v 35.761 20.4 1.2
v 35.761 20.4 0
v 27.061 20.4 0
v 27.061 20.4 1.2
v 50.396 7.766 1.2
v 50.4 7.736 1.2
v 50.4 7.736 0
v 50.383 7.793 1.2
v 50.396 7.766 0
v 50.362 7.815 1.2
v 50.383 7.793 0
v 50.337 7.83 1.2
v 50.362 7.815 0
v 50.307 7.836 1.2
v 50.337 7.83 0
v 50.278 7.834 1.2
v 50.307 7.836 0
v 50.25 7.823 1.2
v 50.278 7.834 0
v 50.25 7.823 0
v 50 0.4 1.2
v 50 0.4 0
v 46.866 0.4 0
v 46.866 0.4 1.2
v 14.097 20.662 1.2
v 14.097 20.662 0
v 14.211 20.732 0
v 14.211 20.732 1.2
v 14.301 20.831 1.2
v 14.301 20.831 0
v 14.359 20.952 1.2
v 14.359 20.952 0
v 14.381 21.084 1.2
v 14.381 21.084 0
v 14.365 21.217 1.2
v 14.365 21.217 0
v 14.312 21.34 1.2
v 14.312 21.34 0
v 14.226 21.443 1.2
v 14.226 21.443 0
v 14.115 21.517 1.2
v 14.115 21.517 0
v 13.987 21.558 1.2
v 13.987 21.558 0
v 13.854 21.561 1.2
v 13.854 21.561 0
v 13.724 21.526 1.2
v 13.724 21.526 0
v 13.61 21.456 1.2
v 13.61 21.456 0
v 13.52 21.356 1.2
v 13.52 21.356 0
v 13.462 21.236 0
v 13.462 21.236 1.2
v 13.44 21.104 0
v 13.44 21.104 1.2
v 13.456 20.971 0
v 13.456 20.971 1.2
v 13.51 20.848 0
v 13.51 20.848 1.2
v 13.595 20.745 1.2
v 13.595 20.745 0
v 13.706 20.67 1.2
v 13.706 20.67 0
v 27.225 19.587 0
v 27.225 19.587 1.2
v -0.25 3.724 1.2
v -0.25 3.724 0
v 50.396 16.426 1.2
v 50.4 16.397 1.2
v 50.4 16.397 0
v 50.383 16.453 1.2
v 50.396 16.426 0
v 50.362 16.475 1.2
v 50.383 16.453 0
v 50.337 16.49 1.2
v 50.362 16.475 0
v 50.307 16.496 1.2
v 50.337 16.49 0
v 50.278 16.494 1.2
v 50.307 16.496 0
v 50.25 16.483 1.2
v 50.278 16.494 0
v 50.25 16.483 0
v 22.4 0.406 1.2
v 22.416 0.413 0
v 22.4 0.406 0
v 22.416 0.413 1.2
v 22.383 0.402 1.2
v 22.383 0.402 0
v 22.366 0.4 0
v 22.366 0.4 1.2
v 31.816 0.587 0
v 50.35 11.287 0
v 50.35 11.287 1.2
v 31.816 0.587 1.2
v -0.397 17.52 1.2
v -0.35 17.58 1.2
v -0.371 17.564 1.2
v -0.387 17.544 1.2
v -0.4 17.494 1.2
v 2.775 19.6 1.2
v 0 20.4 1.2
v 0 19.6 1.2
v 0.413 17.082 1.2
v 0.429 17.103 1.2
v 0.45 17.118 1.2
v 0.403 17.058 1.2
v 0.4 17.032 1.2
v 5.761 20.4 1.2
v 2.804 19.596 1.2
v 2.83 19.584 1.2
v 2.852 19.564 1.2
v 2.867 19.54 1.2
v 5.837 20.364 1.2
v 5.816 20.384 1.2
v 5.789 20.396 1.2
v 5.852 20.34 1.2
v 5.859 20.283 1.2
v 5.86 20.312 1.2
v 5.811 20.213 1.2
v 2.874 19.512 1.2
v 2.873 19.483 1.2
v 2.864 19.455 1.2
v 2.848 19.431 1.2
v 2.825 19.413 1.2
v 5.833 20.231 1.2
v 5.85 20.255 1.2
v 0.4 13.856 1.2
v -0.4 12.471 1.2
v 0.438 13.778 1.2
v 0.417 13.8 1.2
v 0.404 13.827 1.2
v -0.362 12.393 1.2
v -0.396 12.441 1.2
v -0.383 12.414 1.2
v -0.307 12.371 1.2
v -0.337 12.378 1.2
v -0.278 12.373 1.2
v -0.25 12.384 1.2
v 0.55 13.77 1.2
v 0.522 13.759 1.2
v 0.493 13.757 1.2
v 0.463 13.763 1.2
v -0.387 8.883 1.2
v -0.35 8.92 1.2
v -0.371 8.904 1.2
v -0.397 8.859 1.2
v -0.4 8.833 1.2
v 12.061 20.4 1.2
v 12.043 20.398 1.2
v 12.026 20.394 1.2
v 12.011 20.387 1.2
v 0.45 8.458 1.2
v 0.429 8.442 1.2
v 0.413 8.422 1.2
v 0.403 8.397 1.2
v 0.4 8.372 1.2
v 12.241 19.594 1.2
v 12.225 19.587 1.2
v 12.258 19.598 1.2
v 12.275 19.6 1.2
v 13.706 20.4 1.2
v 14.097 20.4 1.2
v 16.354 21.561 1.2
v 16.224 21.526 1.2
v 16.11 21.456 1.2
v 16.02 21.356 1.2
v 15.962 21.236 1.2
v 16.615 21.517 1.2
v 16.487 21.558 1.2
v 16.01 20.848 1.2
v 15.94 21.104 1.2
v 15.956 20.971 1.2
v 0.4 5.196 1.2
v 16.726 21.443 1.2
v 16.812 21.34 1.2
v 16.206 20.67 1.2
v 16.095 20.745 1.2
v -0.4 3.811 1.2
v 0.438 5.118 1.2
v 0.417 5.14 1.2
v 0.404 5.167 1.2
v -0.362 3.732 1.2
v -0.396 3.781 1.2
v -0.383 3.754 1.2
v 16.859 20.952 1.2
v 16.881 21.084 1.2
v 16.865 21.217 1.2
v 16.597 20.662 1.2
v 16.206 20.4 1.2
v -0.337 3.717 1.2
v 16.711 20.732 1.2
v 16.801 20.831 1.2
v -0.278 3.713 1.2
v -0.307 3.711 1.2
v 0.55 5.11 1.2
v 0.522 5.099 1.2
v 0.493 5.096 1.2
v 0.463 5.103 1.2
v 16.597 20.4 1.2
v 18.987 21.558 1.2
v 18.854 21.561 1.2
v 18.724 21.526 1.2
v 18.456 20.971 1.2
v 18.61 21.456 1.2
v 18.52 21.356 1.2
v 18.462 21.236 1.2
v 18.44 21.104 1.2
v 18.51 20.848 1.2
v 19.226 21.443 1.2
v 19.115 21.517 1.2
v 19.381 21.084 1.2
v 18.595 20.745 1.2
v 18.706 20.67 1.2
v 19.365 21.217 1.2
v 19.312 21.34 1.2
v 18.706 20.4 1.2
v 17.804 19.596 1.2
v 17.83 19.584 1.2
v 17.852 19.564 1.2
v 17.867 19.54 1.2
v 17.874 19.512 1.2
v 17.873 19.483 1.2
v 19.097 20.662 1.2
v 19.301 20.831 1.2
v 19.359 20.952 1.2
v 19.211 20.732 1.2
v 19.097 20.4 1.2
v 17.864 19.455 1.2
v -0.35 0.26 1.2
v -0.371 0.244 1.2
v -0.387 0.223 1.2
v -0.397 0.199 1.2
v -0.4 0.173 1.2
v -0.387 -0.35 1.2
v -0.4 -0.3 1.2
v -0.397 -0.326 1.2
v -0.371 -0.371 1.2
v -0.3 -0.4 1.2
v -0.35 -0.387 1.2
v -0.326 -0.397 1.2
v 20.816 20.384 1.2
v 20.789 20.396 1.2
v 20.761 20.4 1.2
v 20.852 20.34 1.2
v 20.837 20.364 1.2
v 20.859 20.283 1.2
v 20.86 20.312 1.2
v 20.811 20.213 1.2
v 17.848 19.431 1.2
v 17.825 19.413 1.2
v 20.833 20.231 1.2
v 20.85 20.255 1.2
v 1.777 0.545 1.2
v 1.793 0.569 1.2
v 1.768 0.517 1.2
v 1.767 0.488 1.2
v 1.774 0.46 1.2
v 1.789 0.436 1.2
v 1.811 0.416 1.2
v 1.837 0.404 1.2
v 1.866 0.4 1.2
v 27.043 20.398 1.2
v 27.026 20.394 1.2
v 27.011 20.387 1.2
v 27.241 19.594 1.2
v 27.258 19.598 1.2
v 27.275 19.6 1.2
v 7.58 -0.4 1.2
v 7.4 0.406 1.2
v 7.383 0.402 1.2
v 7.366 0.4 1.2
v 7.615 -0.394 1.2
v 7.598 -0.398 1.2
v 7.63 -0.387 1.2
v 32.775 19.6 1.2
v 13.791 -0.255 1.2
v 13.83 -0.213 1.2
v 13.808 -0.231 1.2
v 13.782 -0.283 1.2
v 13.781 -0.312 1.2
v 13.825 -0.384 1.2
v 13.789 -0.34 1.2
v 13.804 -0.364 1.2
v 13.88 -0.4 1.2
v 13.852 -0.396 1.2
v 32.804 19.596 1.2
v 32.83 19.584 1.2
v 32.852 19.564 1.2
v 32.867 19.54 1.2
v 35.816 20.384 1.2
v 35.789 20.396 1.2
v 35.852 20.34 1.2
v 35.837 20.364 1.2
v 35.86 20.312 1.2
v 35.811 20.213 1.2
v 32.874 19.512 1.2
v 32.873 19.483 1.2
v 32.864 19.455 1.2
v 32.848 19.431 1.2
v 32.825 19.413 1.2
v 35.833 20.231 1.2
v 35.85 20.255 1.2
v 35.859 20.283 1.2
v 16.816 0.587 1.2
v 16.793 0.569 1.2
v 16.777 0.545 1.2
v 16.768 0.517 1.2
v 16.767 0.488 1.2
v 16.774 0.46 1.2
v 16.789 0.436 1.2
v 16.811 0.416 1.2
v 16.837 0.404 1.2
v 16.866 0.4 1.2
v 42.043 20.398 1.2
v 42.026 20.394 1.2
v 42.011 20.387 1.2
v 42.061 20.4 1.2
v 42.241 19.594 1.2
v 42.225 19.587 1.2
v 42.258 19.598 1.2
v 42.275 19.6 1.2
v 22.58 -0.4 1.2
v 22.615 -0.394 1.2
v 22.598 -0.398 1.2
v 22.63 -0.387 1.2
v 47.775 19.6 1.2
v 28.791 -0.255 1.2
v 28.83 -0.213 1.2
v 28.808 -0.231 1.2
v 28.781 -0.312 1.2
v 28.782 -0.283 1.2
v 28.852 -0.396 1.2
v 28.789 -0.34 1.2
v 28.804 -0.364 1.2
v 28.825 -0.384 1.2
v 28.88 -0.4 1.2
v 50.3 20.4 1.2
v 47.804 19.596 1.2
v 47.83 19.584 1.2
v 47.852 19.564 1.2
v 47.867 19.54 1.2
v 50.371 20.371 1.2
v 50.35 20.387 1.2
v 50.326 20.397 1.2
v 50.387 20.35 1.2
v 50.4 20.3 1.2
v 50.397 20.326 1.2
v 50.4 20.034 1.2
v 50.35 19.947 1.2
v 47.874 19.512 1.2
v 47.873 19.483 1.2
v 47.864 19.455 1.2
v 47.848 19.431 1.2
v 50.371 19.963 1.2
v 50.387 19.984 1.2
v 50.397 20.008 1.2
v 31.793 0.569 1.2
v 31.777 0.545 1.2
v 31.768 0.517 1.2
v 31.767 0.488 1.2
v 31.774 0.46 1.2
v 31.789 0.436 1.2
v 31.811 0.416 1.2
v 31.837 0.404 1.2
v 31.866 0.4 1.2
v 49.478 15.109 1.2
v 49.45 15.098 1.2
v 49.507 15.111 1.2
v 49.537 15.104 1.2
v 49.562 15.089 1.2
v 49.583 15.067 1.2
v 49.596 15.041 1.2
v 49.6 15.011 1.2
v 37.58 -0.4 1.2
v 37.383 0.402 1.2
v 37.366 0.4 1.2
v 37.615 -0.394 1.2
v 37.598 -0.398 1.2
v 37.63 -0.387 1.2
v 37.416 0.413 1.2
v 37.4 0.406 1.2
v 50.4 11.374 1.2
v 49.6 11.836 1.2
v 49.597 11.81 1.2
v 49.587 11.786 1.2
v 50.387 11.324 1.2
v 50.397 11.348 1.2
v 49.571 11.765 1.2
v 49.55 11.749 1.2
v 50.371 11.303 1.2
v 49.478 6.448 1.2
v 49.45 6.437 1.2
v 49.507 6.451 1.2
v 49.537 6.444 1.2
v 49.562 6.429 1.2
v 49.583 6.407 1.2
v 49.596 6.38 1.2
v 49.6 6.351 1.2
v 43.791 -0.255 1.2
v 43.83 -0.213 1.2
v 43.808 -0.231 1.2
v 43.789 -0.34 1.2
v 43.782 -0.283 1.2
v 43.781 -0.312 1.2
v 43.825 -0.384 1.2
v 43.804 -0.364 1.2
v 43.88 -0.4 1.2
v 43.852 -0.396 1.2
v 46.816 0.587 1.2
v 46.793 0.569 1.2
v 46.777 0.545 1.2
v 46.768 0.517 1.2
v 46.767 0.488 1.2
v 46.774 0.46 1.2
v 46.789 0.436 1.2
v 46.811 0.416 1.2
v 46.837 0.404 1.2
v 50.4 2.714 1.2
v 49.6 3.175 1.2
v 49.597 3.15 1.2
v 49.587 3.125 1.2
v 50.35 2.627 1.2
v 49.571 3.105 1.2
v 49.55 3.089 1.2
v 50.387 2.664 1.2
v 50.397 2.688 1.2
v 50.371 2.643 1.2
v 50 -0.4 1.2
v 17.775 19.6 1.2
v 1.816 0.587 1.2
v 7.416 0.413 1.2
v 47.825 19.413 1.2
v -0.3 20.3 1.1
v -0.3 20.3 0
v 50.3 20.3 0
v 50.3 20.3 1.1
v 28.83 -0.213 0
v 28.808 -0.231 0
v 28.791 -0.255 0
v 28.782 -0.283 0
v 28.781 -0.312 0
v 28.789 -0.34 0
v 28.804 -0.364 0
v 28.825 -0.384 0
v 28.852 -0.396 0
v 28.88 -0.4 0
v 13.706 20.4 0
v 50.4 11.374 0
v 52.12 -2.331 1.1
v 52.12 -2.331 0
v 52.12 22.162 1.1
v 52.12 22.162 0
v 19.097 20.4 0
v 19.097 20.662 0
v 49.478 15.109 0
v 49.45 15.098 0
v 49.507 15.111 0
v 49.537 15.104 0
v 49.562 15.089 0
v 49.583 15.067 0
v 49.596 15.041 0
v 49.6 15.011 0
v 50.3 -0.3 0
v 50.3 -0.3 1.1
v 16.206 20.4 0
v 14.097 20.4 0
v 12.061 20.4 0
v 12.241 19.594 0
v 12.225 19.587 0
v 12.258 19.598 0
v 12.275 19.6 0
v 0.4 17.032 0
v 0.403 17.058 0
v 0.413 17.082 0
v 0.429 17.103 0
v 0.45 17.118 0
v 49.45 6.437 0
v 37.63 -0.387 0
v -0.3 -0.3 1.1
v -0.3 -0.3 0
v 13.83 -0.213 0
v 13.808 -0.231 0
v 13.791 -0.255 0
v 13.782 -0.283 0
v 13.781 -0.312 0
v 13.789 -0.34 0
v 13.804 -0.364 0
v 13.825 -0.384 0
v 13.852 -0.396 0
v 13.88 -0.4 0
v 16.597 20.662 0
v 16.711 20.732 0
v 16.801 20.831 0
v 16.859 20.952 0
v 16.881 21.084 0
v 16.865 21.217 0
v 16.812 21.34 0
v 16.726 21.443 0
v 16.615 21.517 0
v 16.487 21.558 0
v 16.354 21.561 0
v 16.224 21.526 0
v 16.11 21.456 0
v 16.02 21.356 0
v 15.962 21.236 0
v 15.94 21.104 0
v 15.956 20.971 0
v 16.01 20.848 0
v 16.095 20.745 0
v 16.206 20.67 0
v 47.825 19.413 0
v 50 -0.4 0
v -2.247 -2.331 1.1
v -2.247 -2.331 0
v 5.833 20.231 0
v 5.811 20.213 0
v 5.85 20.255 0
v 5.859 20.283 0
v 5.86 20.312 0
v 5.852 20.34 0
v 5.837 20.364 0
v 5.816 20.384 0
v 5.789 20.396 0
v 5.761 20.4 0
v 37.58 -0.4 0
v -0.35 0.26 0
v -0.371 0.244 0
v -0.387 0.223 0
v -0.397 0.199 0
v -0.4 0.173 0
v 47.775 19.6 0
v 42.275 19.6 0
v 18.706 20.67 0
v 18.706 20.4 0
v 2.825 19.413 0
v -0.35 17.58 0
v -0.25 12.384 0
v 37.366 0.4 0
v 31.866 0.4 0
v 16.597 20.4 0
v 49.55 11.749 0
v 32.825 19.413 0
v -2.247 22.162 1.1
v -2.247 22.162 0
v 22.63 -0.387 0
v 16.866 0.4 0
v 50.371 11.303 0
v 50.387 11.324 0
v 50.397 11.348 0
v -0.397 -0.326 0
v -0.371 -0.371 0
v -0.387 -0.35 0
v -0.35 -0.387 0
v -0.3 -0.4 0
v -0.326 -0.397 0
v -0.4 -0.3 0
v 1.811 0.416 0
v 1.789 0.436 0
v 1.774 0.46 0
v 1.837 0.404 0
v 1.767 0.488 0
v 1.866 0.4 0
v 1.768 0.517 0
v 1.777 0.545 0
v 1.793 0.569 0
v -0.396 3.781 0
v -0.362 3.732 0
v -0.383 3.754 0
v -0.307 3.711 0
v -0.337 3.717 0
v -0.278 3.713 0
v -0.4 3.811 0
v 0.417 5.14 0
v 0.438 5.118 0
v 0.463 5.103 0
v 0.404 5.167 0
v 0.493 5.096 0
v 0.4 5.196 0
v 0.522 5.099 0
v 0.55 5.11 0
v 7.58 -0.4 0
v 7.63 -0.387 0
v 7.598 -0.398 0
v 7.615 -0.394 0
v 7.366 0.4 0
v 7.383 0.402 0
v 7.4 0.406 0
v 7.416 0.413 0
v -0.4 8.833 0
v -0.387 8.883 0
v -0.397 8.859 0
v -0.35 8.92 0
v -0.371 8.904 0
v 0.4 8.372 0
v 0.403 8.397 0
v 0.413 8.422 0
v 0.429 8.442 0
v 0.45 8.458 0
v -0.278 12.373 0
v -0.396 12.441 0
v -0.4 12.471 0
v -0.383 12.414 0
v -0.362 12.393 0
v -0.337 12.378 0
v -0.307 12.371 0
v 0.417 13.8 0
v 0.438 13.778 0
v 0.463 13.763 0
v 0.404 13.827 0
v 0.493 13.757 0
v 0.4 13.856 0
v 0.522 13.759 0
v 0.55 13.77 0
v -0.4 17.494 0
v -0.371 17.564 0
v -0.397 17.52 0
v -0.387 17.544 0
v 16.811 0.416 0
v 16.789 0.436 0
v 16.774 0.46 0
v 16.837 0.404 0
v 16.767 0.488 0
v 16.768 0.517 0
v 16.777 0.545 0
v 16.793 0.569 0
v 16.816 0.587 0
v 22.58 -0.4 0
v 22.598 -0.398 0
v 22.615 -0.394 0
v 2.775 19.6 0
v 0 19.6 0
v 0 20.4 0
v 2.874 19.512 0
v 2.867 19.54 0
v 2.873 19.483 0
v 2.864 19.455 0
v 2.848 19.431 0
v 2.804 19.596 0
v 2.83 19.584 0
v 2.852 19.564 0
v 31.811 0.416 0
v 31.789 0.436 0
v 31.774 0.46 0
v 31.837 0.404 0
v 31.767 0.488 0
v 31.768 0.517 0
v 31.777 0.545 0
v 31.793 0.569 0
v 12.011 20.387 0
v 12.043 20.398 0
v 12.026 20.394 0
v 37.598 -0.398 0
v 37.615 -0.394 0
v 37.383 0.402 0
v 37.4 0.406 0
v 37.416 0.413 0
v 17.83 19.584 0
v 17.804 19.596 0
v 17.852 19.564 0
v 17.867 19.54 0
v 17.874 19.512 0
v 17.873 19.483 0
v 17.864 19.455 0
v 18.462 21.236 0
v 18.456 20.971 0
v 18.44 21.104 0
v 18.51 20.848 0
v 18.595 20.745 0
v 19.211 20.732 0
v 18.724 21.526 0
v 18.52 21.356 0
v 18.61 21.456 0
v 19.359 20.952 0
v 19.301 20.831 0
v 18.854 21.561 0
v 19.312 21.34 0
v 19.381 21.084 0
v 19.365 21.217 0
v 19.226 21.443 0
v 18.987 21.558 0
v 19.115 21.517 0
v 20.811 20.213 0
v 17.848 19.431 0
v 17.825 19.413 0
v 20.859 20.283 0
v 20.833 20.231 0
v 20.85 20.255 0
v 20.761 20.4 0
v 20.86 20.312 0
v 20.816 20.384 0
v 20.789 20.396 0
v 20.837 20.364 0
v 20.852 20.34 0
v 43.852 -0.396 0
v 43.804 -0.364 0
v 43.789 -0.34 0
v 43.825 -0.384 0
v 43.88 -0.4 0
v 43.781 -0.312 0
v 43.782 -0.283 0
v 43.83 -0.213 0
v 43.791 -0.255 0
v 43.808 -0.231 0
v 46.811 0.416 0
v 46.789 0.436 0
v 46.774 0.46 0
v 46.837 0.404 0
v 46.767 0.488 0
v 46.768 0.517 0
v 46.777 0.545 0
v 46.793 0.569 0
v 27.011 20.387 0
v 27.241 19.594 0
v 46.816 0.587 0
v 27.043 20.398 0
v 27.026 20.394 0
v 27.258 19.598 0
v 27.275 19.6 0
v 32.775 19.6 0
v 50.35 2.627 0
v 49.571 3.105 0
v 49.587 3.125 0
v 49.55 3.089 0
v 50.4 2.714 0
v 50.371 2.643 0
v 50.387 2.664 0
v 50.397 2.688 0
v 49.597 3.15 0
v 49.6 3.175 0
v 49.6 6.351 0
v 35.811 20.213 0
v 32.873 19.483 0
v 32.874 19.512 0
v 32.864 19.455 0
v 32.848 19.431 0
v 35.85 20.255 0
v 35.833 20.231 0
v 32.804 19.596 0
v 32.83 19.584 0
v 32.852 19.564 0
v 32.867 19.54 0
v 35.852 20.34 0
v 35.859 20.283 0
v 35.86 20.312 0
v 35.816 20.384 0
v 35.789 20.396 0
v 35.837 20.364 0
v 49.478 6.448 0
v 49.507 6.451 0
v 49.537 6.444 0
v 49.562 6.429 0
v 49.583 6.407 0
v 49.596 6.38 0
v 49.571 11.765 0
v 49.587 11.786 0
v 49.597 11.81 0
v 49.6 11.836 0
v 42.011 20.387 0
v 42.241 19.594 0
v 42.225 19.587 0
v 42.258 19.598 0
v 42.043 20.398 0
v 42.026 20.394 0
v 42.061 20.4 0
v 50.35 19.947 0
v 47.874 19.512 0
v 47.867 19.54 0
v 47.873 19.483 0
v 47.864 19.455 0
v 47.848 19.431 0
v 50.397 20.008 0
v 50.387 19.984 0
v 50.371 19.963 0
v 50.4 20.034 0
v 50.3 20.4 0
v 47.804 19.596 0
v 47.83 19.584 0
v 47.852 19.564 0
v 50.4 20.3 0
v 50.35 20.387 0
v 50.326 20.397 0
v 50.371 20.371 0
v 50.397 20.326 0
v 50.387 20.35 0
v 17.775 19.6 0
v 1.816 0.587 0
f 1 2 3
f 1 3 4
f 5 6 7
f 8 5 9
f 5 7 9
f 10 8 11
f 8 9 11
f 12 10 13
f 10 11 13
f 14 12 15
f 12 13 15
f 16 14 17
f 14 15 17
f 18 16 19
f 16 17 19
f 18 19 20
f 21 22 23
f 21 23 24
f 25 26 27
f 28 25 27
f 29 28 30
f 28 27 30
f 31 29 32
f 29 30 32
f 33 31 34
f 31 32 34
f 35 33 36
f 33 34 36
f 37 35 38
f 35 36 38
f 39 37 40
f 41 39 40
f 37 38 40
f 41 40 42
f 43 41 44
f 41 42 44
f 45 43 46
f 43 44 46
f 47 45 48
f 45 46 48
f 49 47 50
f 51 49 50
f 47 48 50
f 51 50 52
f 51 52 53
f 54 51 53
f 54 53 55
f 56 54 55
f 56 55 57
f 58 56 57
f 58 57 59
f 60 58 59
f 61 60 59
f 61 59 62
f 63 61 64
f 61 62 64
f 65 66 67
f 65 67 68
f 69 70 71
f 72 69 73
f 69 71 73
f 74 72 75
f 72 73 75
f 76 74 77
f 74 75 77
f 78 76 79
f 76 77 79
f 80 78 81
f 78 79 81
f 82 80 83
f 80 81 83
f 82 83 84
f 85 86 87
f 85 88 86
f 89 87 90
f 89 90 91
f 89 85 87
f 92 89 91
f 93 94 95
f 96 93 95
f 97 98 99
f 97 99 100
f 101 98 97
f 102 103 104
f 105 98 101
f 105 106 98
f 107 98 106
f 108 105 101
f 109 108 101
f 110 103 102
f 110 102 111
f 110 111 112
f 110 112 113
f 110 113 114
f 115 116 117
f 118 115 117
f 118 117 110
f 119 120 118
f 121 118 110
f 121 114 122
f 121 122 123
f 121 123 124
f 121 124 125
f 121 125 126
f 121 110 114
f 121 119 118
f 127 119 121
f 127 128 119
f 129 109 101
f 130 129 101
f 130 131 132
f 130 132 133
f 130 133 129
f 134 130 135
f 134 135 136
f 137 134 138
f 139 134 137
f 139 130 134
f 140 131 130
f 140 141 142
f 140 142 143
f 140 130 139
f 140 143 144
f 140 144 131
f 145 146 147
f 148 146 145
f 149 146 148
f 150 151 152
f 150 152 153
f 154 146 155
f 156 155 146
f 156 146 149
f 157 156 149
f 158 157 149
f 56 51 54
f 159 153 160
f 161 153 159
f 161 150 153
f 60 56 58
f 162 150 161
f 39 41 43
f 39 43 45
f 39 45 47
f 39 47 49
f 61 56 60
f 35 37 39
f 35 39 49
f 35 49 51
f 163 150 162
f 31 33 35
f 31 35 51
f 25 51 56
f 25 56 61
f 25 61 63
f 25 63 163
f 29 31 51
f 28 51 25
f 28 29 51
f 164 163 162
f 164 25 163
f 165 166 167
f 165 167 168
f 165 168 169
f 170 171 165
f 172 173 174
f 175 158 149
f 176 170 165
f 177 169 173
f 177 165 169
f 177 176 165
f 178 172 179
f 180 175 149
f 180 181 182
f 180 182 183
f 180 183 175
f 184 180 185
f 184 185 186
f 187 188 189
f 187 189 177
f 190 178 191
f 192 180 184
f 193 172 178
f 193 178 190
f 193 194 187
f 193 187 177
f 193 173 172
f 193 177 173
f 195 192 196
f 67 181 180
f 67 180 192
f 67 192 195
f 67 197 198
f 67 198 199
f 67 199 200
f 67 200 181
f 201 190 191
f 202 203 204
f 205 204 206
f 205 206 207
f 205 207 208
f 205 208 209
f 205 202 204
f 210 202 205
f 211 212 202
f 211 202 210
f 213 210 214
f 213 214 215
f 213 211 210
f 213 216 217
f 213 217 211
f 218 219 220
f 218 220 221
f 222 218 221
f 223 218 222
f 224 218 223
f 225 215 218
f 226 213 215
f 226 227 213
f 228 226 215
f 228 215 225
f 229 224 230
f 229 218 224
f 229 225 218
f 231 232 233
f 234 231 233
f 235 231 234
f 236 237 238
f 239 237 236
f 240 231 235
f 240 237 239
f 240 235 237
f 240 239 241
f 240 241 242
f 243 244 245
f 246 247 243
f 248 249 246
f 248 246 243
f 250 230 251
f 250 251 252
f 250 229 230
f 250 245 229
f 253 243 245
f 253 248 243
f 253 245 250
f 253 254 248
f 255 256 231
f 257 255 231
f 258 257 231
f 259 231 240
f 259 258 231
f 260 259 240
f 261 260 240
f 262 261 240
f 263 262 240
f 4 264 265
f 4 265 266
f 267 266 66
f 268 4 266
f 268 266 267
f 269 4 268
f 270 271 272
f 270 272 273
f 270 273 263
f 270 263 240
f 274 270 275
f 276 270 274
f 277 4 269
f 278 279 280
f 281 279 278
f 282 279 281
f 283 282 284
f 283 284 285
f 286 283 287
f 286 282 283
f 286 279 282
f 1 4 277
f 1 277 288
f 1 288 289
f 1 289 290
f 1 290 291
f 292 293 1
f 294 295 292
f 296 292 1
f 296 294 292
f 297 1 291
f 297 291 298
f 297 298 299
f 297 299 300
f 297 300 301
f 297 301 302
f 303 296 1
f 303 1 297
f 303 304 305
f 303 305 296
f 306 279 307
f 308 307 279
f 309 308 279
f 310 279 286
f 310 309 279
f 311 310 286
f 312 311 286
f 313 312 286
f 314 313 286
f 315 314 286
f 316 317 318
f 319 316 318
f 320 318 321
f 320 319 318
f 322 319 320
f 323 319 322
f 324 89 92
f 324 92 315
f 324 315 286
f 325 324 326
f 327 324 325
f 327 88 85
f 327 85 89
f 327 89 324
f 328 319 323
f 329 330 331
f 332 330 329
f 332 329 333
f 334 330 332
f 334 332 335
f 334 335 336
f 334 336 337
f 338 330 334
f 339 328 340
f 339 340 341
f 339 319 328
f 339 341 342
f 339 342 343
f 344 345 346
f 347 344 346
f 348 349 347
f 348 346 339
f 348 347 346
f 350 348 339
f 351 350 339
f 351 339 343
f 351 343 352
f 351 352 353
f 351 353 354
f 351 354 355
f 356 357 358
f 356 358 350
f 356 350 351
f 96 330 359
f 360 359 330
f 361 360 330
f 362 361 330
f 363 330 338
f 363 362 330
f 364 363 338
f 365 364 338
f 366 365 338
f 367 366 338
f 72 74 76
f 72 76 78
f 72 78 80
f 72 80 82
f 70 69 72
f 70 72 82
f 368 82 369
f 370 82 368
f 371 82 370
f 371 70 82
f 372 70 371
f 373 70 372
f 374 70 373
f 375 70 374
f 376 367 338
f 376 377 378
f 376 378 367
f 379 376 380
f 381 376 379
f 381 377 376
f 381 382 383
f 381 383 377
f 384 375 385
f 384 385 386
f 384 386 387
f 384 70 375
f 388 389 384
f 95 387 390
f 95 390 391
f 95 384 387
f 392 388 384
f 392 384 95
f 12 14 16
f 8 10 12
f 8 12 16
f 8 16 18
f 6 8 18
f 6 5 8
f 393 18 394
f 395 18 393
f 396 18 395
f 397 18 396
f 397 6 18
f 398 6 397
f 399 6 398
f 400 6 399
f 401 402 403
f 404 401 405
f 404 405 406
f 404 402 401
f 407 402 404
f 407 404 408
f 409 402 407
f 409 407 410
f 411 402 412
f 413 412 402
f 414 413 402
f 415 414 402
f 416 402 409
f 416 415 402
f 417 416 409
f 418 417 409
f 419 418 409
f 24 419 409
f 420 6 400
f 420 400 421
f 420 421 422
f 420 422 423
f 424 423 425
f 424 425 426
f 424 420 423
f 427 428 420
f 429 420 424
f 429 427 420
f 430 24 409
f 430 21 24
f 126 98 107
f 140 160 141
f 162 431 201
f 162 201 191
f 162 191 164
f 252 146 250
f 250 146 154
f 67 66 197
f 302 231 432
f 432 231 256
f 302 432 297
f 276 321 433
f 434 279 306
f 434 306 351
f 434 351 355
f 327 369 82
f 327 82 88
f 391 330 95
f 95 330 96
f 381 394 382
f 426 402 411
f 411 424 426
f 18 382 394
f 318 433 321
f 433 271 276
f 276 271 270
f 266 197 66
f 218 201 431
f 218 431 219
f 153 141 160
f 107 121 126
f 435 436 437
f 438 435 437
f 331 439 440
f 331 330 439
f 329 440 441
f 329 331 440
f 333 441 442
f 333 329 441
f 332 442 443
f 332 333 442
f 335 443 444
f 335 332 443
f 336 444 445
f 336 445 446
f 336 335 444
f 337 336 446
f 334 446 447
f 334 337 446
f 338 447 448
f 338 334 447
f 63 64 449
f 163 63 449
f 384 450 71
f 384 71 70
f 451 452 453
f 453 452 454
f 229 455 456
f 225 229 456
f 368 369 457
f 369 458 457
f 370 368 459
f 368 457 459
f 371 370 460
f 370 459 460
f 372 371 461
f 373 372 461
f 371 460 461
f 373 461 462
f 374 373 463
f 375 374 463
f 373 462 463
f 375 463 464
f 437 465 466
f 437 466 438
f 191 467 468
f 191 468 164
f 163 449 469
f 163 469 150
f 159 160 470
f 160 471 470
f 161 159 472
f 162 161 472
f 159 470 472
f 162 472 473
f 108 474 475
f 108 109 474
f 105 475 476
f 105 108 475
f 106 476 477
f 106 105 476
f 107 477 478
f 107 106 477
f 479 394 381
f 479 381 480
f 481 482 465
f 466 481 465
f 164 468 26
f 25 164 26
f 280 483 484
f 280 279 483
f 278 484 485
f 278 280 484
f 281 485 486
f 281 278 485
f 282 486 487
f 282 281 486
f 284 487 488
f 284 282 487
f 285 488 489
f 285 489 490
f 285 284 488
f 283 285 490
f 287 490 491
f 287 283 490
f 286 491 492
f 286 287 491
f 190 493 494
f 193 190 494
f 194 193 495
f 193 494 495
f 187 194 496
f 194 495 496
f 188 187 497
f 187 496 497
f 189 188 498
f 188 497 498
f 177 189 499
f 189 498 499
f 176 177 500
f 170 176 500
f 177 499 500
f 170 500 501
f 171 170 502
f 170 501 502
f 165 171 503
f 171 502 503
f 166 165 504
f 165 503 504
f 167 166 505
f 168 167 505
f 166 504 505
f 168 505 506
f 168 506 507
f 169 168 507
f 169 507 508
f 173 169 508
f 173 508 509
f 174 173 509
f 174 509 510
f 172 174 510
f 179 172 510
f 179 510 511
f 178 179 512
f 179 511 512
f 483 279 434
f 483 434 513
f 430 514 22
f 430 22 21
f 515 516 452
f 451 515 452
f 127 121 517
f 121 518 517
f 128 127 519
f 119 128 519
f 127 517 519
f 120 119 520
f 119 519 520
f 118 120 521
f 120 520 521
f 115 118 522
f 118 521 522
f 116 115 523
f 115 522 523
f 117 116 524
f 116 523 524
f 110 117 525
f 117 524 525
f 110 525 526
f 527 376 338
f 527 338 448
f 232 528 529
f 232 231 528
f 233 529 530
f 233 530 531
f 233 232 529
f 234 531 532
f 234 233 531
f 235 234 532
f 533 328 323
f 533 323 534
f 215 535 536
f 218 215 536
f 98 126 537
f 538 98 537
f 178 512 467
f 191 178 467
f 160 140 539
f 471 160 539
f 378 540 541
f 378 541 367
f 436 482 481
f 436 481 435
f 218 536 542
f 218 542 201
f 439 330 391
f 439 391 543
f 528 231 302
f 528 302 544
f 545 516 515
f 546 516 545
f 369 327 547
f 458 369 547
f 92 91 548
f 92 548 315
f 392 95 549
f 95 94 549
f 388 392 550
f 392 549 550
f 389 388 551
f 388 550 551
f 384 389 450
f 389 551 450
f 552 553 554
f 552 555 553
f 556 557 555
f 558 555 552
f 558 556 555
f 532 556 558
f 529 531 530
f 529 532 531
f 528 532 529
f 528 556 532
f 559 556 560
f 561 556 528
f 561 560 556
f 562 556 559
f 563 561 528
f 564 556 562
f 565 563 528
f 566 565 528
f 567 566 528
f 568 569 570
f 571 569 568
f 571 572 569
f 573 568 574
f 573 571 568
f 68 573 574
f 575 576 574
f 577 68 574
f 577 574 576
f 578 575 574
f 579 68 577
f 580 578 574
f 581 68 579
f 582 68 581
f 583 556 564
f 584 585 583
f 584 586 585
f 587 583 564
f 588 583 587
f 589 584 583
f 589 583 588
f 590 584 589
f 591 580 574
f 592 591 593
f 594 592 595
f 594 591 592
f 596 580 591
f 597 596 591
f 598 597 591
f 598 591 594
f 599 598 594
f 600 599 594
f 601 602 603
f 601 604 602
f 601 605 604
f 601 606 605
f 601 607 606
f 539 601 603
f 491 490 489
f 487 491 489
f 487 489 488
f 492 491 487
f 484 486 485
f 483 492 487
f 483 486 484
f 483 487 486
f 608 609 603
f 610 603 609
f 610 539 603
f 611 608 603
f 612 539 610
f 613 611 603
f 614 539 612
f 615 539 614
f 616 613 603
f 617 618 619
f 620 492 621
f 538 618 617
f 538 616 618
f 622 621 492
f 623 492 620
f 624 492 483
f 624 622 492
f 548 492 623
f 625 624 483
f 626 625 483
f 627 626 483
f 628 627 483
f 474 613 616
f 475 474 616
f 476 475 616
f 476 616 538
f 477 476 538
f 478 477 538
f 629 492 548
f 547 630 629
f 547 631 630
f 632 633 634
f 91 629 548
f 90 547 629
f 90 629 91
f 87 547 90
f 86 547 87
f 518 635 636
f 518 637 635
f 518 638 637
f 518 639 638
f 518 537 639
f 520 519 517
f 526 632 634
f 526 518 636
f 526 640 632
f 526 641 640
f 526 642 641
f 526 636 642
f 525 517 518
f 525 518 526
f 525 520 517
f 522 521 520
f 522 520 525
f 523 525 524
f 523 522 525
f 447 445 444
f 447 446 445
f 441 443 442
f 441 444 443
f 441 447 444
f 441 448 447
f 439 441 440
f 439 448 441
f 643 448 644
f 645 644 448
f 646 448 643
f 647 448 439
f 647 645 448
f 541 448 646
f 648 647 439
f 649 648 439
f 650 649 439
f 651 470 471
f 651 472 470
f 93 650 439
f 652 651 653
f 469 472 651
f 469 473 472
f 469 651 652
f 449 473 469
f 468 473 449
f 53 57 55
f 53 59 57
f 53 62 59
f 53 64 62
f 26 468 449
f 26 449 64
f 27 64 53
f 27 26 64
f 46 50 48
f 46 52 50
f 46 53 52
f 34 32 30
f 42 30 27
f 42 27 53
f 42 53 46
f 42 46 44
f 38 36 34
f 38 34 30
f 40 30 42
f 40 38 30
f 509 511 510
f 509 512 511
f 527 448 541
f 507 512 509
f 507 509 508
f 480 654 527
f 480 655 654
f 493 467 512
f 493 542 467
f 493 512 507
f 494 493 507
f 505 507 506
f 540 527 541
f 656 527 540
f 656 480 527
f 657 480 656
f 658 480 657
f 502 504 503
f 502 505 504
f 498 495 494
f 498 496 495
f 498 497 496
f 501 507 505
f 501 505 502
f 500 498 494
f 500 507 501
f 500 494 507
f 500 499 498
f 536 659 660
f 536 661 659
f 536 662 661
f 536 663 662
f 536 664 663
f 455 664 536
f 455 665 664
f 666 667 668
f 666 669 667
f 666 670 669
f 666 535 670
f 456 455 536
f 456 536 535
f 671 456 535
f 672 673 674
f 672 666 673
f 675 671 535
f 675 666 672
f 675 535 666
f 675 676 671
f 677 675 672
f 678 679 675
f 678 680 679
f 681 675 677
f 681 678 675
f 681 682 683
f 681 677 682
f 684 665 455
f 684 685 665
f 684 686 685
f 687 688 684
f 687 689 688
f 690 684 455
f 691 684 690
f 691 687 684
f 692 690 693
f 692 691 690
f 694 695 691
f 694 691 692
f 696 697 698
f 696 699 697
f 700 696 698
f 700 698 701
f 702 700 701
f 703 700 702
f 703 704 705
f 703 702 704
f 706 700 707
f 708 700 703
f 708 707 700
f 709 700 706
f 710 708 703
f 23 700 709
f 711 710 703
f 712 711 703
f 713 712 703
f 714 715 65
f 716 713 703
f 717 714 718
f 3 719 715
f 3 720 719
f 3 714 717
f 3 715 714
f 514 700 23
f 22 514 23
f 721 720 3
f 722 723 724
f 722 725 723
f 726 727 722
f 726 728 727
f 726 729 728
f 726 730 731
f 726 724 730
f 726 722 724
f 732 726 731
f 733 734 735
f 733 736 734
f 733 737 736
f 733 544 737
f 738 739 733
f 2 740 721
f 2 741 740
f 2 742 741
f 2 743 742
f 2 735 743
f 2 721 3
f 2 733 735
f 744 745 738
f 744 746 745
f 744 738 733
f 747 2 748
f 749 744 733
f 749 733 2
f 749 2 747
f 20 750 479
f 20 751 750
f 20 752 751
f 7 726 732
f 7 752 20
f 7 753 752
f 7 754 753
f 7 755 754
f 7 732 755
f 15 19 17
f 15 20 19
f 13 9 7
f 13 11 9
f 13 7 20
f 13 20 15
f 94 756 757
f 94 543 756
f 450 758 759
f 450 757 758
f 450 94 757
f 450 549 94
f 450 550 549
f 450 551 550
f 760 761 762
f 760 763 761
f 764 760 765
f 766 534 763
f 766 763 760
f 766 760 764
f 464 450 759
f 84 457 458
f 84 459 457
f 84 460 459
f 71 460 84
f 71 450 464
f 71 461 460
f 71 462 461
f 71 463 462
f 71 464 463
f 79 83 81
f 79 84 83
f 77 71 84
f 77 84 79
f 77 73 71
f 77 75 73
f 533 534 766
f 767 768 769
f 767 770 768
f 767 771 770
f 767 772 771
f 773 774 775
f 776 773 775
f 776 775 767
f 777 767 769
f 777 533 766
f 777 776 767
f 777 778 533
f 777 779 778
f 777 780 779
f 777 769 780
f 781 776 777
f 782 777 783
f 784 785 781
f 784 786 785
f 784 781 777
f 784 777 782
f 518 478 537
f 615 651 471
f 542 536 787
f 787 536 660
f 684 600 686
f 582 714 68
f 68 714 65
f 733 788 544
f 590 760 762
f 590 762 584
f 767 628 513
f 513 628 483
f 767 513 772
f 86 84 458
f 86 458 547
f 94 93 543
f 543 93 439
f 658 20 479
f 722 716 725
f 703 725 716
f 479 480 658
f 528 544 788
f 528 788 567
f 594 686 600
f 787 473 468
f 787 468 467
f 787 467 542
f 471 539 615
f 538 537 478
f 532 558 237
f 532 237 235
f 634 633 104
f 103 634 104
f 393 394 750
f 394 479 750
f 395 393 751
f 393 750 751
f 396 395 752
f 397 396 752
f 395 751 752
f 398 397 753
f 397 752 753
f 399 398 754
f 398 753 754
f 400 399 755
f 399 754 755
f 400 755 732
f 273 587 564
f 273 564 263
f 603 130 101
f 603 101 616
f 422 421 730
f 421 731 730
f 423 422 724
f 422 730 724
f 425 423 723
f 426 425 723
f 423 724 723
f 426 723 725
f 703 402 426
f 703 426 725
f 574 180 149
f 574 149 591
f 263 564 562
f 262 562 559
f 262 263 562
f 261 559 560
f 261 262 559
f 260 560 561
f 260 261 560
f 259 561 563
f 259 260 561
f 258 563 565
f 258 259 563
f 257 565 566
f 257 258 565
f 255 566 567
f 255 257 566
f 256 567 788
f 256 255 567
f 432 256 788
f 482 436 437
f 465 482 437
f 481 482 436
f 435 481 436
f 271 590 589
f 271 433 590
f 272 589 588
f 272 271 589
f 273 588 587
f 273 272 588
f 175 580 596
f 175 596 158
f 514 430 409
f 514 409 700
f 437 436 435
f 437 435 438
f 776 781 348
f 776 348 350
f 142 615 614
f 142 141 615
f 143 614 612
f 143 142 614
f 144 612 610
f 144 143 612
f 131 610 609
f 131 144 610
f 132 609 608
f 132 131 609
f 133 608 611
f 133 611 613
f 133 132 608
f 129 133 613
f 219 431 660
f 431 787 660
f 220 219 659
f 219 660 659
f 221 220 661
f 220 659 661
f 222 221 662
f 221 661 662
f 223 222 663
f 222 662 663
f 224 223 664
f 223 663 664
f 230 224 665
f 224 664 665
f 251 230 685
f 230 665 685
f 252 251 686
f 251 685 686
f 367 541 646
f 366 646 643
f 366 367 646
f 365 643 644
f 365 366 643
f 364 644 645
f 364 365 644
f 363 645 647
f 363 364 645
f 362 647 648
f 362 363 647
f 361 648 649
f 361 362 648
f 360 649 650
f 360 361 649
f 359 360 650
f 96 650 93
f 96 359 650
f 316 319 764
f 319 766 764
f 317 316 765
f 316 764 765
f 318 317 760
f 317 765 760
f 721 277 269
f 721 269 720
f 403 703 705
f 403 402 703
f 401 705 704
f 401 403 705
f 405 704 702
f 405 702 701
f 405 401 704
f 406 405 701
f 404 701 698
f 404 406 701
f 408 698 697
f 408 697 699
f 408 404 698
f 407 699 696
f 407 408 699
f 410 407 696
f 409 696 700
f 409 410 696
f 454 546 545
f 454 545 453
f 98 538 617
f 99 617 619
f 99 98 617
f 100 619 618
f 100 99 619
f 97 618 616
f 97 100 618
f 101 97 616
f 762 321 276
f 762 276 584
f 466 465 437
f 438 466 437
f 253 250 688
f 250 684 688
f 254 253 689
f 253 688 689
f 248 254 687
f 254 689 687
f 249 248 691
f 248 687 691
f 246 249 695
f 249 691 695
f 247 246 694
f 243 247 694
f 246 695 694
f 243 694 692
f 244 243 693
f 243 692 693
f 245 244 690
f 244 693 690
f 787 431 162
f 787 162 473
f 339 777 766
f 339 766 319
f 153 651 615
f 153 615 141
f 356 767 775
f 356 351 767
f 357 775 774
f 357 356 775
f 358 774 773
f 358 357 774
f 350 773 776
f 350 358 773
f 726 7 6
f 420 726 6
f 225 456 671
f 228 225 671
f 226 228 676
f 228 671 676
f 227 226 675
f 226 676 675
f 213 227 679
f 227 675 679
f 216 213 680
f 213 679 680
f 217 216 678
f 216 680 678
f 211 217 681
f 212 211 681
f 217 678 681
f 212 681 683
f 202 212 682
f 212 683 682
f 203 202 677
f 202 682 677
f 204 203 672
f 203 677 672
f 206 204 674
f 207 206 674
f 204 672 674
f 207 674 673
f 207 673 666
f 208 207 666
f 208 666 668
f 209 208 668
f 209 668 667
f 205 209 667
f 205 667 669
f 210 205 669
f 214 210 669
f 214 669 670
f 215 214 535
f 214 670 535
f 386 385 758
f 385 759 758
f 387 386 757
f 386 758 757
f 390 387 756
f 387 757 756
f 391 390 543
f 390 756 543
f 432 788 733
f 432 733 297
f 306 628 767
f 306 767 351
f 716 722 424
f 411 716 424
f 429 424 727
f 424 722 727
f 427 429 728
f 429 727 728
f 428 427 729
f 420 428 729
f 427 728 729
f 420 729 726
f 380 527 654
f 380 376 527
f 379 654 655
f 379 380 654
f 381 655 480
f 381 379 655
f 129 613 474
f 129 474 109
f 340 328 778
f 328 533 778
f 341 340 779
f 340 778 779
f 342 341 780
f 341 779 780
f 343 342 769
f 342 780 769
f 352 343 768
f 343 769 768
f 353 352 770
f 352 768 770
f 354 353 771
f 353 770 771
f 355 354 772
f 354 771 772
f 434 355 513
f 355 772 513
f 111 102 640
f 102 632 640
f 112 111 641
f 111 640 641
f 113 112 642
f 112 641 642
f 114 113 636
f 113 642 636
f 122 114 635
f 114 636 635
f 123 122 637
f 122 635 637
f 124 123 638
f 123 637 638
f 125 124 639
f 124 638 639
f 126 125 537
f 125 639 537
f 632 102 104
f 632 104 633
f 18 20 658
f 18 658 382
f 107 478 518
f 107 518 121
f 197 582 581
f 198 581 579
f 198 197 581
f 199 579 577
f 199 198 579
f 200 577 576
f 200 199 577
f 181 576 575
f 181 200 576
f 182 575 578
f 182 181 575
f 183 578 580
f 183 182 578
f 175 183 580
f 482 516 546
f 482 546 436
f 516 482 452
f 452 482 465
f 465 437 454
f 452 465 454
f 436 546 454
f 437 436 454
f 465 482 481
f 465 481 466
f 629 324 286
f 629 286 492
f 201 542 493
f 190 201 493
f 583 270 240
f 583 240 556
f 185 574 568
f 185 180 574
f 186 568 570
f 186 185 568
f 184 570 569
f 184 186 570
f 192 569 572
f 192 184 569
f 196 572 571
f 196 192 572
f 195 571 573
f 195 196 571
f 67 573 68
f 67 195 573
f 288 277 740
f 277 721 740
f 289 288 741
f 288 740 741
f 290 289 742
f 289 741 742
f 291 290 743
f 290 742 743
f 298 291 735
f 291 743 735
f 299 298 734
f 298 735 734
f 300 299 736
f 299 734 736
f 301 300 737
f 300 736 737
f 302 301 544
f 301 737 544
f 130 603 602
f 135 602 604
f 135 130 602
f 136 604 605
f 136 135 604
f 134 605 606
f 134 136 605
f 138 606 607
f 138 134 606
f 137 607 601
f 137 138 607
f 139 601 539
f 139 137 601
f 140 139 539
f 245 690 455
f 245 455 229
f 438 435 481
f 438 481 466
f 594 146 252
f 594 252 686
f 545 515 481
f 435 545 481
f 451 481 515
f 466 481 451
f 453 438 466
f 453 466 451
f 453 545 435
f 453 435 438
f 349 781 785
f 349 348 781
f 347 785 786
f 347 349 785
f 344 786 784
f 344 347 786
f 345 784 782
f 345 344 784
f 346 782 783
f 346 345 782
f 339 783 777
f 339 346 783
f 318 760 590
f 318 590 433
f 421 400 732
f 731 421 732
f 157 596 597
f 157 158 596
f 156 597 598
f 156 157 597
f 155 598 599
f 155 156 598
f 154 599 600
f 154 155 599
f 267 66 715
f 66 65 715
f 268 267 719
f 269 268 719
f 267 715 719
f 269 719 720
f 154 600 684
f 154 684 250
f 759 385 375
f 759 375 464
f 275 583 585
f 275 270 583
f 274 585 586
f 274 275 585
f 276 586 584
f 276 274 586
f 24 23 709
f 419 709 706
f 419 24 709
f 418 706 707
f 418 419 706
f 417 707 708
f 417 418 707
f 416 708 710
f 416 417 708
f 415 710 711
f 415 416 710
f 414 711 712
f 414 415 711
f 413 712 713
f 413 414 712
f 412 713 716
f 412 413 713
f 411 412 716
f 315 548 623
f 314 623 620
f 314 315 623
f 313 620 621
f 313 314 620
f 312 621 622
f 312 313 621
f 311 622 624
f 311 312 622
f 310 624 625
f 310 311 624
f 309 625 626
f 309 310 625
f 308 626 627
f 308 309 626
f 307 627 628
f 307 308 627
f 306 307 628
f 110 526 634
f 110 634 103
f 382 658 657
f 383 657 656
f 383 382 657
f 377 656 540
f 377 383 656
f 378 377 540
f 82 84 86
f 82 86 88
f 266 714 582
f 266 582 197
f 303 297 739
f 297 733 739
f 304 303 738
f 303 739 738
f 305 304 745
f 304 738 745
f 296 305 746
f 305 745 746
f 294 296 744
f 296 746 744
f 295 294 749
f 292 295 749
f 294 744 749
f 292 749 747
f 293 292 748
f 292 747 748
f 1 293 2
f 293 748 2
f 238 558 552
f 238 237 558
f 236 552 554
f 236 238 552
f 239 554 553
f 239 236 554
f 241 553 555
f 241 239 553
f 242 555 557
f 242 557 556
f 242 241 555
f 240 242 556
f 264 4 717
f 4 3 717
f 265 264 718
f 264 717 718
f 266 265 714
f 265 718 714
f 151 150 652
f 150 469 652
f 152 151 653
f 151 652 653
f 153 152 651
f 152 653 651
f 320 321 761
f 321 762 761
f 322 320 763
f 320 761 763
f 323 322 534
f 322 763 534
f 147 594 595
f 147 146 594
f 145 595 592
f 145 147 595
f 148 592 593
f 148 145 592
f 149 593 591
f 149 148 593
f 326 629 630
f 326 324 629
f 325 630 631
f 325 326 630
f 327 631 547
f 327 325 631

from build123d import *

# Parameters (mm, degrees)
F5_W      = 62.8235205077
F5_H      = 37.2700802982
F6_DEPTH  = 25
F8_W      = 50.6
F8_H      = 20.6
F9_DEPTH  = 1.1
F10_R     = 0.1
F12_DEPTH = 1.2
F13_W     = 54.367583245
F13_H     = 24.4925916195
F13_W_2   = 50.6
F13_H_2   = 20.6
F14_DEPTH = 1.1


with BuildPart() as f4:
    # F4: sweep along a path in F1
    with BuildLine(Plane.XY) as f4_path:
        Line((0, 20), (4.6410161514, 20))
        Line((4.6410161514, 20), (0, 17.3205080757))
        Line((0, 17.3205080757), (0, 12.9903810568))
        Line((0, 12.9903810568), (12.1410161514, 20))
        Line((12.1410161514, 20), (19.6410161514, 20))
        Line((19.6410161514, 20), (0, 8.6602540378))
        Line((0, 8.6602540378), (0, 4.3301270189))
        Line((0, 4.3301270189), (27.1410161514, 20))
        Line((27.1410161514, 20), (34.6410161514, 20))
        Line((34.6410161514, 20), (0, 0))
        Line((0, 0), (7.5, 0))
        Line((7.5, 0), (42.1410161514, 20))
        Line((42.1410161514, 20), (49.6410161514, 20))
        Line((49.6410161514, 20), (15, 0))
        Line((15, 0), (22.5, 0))
        Line((22.5, 0), (50, 15.8771324027))
        Line((50, 15.8771324027), (50, 11.5470053838))
        Line((50, 11.5470053838), (30, 0))
        Line((30, 0), (37.5, 0))
        Line((37.5, 0), (50, 7.2168783649))
        Line((50, 7.2168783649), (50, 2.8867513459))
        Line((50, 2.8867513459), (45, 0))
        Line((45, 0), (50, 0))
    # F3 (on line) → F4 (sweep)
    with BuildSketch(Plane.YZ):
        Polygon((19.6, 0), (20, 0), (20.4, 0), (20.4, 1.2), (20, 1.2), (19.6, 1.2), align=None)
    sweep(path=f4_path.line, transition=Transition.RIGHT)


with BuildPart() as f6:
    # F5 (on Top) → F6 (new body)
    with BuildSketch(Plane.XY):
        with Locations((25.02031927, 9.5404535532)):
            Rectangle(F5_W, F5_H)
        Polygon((-0.4, 3.6373066959), (-0.4, 8.8911941455), (-0.4, 20.4), (0, 20.4), (6.1338364744, 20.4), (50.4, 20.4), (50.4, 16.5699527257), (50.4, 11.3160652761), (50.4, -0.4), (37.607179677, -0.4), (28.507179677, -0.4), (-0.4, -0.4), align=None, mode=Mode.SUBTRACT)
    extrude(amount=F6_DEPTH)


with BuildPart() as f4_1:
    add(f4.part)

    # F7: cut F6
    add(f6.part, mode=Mode.SUBTRACT)

    # F10
    f10_edges = [f4_1.edges().sort_by_distance(p)[0] for p in [
        (-0.4, 17.551448, 0.6),
        (3.148196, 19.6, 0.6),
        (6.133836, 20.4, 0.6),
        (0.4, 17.089568, 0.6),
        (0.4, 13.683201, 0.6),
        (-0.4, 12.297561, 0.6),
        (12.248196, 19.6, 0.6),
        (12.033836, 20.4, 0.6),
        (18.148196, 19.6, 0.6),
        (21.133836, 20.4, 0.6),
        (27.033836, 20.4, 0.6),
        (-0.4, 8.891194, 0.6),
        (0.4, 8.429314, 0.6),
        (0.4, 5.022947, 0.6),
        (-0.4, 3.637307, 0.6),
        (27.248196, 19.6, 0.6),
        (33.148196, 19.6, 0.6),
        (36.133836, 20.4, 0.6),
        (42.033836, 20.4, 0.6),
        (-0.4, 0.23094, 0.6),
        (1.49282, 0.4, 0.6),
        (-0.4, -0.4, 0.6),
        (7.39282, 0.4, 0.6),
        (7.60718, -0.4, 0.6),
        (42.248196, 19.6, 0.6),
        (48.148196, 19.6, 0.6),
        (50.4, 20.4, 0.6),
        (50.4, 19.976319, 0.6),
        (50.4, 16.569953, 0.6),
        (49.6, 15.184312, 0.6),
        (49.6, 11.777945, 0.6),
        (50.4, 11.316065, 0.6),
        (28.50718, -0.4, 0.6),
        (31.49282, 0.4, 0.6),
        (22.60718, -0.4, 0.6),
        (13.50718, -0.4, 0.6),
        (16.49282, 0.4, 0.6),
        (37.39282, 0.4, 0.6),
        (22.39282, 0.4, 0.6),
        (50.4, 7.909699, 0.6),
        (49.6, 6.524058, 0.6),
        (37.60718, -0.4, 0.6),
        (43.50718, -0.4, 0.6),
        (50.4, 2.655811, 0.6),
        (46.49282, 0.4, 0.6),
        (49.6, 3.117691, 0.6),
    ]]
    fillet(f10_edges, radius=F10_R)

    # F11 (on Top) → F12 (join, through all)
    with BuildSketch(Plane.XY):
        with BuildLine():
            Line((16.5969616764, 20.4), (16.5969616764, 20.6616236331))
            ThreePointArc((16.5969616764, 20.6616236331), (16.4205801226, 21.5640753587), (16.2062010934, 20.6698879056))
            Line((16.2062010934, 20.6698879056), (16.2062010934, 20.4))
            Line((16.2062010934, 20.4), (16.5969616764, 20.4))
        make_face()
        with BuildLine():
            Line((19.0969616764, 20.4), (19.0969616764, 20.6616236331))
            ThreePointArc((19.0969616764, 20.6616236331), (18.9205801226, 21.5640753587), (18.7062010934, 20.6698879056))
            Line((18.7062010934, 20.6698879056), (18.7062010934, 20.4))
            Line((18.7062010934, 20.4), (19.0969616764, 20.4))
        make_face()
        with BuildLine():
            Line((14.0969616764, 20.4), (14.0969616764, 20.6616236331))
            ThreePointArc((14.0969616764, 20.6616236331), (13.9205801226, 21.5640753587), (13.7062010934, 20.6698879056))
            Line((13.7062010934, 20.6698879056), (13.7062010934, 20.4))
            Line((13.7062010934, 20.4), (14.0969616764, 20.4))
        make_face()
    extrude(amount=F12_DEPTH)


with BuildPart() as f9:
    # F8 (on Top) → F9 (new body)
    with BuildSketch(Plane.XY):
        with Locations((25, 10)):
            Rectangle(F8_W, F8_H)
    extrude(amount=F9_DEPTH)


with BuildPart() as f14:
    # F13 (on Top) → F14 (new body, through all)
    with BuildSketch(Plane.XY):
        with Locations((24.9365065247, 9.9155176431)):
            Rectangle(F13_W, F13_H)
        with Locations((25, 10)):
            Rectangle(F13_W_2, F13_H_2, mode=Mode.SUBTRACT)
    extrude(amount=F14_DEPTH)


solid = Compound([f4_1.part, f9.part, f14.part])
